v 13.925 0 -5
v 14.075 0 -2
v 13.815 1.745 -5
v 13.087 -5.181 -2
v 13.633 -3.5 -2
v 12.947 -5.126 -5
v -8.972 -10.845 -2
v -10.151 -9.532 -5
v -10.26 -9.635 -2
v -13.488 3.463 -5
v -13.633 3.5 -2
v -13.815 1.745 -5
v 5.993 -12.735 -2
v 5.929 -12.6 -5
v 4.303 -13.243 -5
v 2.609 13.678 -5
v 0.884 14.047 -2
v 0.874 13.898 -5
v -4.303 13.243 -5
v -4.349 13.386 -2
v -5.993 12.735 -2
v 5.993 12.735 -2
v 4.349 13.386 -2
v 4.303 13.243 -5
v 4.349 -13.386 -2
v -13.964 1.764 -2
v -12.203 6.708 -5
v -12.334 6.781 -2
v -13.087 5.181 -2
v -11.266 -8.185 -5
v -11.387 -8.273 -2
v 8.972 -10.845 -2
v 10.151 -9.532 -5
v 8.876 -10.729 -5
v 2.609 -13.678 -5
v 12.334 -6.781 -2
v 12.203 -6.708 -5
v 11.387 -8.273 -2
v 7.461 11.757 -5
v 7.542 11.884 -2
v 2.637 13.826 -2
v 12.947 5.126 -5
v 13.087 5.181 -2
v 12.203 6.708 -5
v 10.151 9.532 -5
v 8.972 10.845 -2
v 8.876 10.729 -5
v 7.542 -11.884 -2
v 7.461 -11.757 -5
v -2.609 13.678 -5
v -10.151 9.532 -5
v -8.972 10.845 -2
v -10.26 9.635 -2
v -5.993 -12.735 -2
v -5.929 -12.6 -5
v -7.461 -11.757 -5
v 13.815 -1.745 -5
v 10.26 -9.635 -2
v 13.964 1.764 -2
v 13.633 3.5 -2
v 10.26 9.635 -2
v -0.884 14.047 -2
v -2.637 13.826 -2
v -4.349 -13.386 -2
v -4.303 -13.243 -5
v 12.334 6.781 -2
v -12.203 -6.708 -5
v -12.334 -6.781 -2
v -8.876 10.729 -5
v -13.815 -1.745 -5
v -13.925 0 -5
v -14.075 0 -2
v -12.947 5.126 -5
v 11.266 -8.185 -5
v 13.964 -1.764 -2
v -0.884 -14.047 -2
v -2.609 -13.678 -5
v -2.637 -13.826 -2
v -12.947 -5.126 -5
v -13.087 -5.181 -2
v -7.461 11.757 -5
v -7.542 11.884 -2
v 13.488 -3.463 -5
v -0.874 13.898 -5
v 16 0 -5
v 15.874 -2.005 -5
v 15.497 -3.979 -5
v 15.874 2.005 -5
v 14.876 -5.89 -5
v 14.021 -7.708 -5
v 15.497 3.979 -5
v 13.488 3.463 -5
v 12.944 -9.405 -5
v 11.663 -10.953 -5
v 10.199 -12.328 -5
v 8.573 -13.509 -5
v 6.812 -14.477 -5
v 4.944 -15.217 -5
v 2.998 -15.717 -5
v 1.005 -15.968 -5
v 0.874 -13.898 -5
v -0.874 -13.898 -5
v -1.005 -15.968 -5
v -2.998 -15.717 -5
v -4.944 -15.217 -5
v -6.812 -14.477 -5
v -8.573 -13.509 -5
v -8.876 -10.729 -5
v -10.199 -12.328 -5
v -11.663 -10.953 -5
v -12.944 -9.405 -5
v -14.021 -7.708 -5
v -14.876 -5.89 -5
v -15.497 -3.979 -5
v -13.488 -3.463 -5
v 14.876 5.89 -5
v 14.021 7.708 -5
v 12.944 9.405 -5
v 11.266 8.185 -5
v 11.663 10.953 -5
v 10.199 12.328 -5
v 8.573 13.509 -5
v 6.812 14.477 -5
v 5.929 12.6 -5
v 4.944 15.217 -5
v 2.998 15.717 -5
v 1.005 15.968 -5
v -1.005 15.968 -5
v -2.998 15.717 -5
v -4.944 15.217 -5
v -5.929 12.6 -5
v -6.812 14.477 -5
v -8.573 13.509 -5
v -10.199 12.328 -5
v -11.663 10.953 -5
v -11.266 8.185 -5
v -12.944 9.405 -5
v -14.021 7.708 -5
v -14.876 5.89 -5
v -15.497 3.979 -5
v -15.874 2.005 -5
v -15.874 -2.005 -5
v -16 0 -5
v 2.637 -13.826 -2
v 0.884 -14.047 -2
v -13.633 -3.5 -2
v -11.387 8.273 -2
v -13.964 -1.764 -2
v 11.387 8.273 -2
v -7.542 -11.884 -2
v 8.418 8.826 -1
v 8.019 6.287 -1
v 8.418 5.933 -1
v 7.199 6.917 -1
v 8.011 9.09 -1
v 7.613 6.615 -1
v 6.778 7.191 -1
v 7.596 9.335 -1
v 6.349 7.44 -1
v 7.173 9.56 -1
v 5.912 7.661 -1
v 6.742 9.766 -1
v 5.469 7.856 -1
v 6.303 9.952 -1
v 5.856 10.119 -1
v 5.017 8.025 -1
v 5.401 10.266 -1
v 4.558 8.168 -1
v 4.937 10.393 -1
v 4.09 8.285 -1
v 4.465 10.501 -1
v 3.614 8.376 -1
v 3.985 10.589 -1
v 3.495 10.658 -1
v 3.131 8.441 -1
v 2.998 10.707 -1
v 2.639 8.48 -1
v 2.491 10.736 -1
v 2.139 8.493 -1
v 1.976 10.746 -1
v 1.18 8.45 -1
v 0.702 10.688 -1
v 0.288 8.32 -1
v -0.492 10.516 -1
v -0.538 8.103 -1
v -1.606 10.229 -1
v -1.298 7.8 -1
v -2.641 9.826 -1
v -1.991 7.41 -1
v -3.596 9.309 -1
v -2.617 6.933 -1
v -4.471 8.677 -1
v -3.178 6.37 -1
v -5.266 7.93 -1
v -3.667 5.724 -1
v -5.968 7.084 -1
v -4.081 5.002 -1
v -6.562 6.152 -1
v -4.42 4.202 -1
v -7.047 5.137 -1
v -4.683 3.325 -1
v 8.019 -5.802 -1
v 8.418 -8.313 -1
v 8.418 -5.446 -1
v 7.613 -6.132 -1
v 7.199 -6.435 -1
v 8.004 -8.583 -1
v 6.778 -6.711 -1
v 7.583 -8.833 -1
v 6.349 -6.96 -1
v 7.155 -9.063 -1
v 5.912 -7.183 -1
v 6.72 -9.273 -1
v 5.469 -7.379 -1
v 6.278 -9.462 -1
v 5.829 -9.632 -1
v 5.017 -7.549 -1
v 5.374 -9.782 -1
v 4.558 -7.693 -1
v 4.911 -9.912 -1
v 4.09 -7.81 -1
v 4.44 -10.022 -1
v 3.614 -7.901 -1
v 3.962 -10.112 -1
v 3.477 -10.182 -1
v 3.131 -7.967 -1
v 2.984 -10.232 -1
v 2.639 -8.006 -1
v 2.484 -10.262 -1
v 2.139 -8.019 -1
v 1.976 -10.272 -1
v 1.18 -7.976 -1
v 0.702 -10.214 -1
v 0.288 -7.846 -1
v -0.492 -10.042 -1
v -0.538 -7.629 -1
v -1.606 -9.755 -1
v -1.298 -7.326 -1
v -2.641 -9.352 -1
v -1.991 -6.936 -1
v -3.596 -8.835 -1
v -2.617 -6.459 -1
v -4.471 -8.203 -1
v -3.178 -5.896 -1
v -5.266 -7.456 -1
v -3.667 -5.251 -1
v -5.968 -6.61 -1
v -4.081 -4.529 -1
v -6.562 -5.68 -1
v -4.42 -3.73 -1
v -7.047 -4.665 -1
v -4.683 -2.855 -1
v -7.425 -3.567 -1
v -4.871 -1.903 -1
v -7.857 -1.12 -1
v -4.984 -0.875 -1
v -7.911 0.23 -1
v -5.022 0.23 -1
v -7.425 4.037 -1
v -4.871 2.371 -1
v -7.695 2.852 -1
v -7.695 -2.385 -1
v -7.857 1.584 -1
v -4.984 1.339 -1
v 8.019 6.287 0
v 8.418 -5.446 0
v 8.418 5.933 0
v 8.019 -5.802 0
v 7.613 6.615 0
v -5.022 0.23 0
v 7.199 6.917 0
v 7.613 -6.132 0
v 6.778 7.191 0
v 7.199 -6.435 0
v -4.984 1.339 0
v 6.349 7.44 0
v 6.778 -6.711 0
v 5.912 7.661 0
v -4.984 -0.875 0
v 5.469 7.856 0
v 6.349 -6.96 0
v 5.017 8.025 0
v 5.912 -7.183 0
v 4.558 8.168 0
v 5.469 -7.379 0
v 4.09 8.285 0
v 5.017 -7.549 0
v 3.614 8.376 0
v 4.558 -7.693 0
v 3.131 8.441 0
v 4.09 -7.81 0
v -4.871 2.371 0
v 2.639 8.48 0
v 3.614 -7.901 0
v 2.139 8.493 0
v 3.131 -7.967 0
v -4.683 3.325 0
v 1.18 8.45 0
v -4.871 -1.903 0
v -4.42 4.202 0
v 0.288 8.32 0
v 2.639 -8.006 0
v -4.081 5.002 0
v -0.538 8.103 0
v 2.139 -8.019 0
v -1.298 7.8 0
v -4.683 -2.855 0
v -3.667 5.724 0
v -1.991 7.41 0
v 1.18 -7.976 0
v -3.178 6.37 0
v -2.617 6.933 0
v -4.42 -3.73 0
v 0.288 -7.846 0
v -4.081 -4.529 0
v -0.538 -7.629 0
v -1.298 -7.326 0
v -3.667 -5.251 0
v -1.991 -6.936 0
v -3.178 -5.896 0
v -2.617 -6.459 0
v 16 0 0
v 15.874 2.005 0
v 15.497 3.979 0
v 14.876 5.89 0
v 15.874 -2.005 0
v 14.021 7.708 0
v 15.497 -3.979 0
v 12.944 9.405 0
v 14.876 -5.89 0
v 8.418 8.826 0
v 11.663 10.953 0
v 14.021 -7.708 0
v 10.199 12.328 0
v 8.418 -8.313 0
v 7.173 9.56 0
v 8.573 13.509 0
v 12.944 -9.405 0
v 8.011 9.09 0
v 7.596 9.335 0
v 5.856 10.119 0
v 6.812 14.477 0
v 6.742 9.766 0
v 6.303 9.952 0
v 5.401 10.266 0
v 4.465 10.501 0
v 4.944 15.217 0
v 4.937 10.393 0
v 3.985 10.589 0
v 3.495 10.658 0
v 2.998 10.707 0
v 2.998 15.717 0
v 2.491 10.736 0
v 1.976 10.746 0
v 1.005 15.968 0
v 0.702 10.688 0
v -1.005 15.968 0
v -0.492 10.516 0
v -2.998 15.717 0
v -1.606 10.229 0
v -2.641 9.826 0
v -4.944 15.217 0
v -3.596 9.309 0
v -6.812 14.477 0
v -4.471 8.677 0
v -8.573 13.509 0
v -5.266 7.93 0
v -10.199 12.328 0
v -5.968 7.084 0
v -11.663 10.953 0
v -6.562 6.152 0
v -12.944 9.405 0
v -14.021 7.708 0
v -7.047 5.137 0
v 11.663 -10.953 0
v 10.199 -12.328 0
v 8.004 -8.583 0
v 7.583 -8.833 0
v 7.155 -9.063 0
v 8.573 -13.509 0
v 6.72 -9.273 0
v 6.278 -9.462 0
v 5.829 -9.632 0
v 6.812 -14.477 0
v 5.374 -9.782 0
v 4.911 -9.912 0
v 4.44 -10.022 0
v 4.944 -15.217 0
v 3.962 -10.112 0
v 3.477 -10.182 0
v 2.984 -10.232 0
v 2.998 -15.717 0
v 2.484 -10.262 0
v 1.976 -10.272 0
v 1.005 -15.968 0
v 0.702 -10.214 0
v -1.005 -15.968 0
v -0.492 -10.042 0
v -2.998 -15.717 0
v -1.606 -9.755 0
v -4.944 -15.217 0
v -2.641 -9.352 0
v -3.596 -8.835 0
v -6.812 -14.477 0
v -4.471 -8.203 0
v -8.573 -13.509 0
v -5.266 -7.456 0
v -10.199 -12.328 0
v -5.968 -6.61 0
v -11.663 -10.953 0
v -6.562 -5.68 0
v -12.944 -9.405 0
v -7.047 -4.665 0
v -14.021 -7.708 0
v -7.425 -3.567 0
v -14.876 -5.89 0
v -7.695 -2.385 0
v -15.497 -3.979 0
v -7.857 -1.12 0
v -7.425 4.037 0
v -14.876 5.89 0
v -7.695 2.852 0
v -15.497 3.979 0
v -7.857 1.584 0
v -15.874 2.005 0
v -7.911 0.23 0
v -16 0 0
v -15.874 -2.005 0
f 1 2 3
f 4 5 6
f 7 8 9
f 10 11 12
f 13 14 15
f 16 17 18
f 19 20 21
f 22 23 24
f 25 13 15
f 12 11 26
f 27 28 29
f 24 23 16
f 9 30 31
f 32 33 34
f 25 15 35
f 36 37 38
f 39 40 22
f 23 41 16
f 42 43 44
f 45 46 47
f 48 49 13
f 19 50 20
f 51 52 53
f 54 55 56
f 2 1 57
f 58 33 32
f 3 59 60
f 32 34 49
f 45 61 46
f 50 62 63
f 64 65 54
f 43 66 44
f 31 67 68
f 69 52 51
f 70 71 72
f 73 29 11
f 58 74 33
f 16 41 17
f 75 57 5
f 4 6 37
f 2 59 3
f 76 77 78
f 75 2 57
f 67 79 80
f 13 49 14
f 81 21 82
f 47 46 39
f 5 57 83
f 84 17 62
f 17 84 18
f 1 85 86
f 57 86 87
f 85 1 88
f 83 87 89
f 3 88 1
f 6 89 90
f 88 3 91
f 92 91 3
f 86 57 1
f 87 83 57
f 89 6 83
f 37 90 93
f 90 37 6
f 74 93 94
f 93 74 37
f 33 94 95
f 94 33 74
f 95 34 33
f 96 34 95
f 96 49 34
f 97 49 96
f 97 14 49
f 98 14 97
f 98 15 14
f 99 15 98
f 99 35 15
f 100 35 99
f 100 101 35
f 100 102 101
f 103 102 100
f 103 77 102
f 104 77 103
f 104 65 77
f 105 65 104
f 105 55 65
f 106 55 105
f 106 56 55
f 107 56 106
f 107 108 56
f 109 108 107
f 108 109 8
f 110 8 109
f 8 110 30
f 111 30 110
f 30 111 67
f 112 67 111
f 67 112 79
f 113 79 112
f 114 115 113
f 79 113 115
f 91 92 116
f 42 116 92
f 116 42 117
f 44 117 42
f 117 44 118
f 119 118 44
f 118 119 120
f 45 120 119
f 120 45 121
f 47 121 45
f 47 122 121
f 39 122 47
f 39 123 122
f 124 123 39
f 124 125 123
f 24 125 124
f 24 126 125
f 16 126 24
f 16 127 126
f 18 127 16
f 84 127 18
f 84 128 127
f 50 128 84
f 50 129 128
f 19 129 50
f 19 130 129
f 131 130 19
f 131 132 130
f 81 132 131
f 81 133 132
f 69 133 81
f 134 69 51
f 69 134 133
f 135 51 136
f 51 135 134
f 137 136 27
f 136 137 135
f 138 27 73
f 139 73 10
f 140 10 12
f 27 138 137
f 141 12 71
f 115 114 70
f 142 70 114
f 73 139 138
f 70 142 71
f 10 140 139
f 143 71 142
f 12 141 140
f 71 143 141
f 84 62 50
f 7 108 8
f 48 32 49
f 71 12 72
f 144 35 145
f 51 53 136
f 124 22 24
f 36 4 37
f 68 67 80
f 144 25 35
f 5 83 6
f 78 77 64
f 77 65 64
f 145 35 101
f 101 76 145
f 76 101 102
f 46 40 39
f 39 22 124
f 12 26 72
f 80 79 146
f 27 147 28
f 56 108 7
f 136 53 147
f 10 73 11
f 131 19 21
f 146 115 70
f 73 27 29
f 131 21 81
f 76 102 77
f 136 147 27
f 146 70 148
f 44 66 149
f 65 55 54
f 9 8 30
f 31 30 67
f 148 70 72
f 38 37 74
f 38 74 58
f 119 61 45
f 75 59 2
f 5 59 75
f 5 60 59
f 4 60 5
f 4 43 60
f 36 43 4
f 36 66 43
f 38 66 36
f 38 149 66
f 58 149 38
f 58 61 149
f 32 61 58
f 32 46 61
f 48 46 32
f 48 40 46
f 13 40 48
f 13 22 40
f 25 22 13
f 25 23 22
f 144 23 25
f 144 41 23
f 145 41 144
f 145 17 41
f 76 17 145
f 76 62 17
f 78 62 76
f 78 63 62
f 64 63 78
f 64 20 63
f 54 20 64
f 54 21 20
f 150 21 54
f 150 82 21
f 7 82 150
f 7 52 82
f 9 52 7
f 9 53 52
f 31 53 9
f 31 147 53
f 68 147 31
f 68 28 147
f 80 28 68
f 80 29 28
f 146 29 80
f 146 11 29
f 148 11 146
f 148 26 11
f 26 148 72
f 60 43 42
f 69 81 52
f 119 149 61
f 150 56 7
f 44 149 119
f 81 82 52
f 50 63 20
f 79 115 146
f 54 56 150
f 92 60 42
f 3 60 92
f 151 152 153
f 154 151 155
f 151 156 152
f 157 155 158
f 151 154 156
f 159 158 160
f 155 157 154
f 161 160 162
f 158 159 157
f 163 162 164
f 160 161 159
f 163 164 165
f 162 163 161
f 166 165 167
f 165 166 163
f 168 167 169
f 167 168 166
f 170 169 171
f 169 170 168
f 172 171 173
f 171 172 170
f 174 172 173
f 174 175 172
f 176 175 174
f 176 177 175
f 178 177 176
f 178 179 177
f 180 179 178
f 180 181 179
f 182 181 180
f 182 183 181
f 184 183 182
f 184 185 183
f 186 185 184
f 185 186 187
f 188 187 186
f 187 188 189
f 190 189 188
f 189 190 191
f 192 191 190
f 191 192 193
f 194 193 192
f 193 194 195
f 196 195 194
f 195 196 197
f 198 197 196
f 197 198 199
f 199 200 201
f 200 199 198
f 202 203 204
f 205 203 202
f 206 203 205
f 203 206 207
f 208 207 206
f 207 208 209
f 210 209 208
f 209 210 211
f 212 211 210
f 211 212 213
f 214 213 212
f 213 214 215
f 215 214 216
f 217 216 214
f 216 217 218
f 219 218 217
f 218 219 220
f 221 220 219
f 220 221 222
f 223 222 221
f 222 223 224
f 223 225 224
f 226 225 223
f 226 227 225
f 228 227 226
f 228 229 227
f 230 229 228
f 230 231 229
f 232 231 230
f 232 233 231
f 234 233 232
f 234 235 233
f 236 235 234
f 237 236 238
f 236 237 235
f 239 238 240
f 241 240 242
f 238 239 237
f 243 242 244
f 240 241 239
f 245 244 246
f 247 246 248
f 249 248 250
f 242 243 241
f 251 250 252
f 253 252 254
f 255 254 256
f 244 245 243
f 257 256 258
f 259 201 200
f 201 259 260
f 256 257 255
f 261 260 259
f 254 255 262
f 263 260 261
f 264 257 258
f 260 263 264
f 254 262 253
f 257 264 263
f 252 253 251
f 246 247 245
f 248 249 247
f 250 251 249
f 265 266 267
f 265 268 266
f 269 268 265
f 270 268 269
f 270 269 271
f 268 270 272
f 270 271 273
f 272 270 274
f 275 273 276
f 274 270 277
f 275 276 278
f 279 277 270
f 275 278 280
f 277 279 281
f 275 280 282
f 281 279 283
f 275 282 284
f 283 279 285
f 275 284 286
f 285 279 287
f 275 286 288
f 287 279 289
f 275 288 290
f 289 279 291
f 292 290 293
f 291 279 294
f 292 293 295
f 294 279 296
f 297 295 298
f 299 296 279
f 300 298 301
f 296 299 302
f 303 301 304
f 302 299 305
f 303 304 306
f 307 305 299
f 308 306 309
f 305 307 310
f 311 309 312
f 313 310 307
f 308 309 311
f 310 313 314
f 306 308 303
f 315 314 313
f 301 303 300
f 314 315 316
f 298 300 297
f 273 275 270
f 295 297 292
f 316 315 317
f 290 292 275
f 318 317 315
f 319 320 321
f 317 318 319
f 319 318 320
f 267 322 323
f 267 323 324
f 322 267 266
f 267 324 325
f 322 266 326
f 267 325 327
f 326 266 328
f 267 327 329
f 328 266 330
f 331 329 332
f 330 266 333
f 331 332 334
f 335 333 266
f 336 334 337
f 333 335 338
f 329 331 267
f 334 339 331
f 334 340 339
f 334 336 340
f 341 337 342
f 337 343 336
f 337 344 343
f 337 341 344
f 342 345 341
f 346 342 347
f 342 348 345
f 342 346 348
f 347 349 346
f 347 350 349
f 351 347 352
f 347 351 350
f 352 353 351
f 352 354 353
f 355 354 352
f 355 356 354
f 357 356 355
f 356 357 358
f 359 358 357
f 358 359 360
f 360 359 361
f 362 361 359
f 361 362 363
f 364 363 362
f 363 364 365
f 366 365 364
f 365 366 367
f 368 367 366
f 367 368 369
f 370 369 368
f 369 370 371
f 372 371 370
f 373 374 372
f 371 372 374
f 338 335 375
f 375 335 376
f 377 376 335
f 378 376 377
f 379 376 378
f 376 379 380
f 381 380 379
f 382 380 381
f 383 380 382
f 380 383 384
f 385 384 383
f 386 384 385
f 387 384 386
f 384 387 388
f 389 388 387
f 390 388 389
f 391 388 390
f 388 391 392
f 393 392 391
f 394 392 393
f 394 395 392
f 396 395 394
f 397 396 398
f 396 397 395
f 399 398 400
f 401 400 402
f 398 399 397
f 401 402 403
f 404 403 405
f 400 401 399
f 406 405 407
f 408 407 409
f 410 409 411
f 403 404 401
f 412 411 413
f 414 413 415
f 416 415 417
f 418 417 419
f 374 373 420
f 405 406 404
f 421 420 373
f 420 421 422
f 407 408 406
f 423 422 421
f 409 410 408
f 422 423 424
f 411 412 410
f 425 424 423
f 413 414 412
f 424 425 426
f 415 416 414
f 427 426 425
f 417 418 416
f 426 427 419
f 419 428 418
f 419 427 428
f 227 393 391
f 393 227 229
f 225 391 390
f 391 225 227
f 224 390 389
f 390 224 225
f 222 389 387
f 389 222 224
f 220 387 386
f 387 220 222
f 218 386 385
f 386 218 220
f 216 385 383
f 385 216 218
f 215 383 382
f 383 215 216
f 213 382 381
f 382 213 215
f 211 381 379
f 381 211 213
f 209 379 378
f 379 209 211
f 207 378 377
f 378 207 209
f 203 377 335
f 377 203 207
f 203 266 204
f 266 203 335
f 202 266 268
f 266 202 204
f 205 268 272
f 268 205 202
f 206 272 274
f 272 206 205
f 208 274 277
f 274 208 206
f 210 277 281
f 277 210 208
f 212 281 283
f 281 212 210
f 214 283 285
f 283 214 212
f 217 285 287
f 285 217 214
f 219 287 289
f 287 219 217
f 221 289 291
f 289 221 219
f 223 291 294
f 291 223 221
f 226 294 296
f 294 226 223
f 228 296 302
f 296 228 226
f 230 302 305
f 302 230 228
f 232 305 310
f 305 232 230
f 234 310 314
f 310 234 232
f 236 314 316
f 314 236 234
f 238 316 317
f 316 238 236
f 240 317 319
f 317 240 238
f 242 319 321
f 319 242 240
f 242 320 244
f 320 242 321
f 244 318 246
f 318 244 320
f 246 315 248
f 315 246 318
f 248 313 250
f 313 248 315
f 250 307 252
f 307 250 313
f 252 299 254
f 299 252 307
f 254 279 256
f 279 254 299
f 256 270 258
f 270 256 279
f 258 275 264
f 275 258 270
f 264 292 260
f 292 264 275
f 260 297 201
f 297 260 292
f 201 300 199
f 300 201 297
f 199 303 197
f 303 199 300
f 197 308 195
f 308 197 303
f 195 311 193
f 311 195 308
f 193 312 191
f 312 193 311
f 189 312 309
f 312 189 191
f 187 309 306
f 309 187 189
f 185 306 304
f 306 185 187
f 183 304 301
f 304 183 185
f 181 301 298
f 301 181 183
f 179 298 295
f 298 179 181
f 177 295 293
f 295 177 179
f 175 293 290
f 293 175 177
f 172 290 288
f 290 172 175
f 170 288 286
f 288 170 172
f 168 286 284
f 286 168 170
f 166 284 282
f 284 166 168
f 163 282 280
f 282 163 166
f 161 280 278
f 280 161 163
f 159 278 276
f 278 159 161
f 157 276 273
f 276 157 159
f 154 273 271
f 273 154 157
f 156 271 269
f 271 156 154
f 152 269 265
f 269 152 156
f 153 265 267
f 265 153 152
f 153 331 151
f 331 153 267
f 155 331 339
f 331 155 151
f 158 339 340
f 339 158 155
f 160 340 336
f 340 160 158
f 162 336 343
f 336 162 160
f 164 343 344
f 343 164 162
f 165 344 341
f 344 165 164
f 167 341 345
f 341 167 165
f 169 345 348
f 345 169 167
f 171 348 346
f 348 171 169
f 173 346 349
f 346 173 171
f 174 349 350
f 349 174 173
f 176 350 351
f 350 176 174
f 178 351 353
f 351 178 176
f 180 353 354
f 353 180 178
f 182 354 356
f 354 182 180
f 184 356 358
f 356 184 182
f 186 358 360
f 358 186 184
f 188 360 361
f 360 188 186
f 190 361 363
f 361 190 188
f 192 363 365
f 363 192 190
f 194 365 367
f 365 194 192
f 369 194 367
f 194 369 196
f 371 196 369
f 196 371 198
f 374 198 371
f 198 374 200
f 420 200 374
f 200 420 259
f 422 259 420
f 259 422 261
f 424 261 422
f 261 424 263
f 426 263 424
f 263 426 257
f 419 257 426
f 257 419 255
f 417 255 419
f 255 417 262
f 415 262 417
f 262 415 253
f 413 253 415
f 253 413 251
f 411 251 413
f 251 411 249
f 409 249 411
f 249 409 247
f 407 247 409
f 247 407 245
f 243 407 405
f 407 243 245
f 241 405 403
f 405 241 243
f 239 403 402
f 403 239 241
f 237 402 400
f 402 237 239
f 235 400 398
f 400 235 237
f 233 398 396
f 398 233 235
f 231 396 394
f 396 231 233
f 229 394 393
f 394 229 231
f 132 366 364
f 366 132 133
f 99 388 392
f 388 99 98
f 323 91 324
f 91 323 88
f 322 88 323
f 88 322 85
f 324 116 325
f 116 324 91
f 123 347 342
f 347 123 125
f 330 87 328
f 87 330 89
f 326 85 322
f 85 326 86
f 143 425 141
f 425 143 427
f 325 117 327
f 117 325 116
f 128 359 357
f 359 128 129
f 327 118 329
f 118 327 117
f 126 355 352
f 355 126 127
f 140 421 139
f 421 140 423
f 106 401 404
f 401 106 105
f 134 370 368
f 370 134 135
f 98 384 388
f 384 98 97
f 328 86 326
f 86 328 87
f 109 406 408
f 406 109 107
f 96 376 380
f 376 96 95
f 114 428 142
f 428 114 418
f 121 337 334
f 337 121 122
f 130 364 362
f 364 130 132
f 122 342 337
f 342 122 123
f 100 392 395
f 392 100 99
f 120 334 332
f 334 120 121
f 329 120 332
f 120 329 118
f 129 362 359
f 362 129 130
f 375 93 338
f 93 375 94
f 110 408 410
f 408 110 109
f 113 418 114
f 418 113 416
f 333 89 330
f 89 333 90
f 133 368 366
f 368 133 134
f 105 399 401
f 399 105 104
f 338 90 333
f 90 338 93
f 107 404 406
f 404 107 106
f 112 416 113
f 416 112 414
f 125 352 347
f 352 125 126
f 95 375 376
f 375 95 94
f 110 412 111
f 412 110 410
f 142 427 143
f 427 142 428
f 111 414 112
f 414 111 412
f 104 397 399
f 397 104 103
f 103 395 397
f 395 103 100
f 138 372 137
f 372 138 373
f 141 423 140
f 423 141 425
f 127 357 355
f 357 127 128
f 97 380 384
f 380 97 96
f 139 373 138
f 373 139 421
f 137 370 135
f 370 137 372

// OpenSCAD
$fn = 50;


difference() {
	union() {
		translate(v = [0, 0, -5.0000000000]) {
			cylinder(h = 5, r = 16.0000000000);
		}
	}
	union() {
		#translate(v = [0, 0, -5.0000000000]) {
			cylinder(h = 3, r1 = 13.9250000000, r2 = 14.0750000000);
		}
		translate(v = [0, 0, -1]) {
			linear_extrude(height = 1) {
				text(font = "Impact", halign = "center", size = 20, text = "C", valign = "center");
			}
		}
	}
}
